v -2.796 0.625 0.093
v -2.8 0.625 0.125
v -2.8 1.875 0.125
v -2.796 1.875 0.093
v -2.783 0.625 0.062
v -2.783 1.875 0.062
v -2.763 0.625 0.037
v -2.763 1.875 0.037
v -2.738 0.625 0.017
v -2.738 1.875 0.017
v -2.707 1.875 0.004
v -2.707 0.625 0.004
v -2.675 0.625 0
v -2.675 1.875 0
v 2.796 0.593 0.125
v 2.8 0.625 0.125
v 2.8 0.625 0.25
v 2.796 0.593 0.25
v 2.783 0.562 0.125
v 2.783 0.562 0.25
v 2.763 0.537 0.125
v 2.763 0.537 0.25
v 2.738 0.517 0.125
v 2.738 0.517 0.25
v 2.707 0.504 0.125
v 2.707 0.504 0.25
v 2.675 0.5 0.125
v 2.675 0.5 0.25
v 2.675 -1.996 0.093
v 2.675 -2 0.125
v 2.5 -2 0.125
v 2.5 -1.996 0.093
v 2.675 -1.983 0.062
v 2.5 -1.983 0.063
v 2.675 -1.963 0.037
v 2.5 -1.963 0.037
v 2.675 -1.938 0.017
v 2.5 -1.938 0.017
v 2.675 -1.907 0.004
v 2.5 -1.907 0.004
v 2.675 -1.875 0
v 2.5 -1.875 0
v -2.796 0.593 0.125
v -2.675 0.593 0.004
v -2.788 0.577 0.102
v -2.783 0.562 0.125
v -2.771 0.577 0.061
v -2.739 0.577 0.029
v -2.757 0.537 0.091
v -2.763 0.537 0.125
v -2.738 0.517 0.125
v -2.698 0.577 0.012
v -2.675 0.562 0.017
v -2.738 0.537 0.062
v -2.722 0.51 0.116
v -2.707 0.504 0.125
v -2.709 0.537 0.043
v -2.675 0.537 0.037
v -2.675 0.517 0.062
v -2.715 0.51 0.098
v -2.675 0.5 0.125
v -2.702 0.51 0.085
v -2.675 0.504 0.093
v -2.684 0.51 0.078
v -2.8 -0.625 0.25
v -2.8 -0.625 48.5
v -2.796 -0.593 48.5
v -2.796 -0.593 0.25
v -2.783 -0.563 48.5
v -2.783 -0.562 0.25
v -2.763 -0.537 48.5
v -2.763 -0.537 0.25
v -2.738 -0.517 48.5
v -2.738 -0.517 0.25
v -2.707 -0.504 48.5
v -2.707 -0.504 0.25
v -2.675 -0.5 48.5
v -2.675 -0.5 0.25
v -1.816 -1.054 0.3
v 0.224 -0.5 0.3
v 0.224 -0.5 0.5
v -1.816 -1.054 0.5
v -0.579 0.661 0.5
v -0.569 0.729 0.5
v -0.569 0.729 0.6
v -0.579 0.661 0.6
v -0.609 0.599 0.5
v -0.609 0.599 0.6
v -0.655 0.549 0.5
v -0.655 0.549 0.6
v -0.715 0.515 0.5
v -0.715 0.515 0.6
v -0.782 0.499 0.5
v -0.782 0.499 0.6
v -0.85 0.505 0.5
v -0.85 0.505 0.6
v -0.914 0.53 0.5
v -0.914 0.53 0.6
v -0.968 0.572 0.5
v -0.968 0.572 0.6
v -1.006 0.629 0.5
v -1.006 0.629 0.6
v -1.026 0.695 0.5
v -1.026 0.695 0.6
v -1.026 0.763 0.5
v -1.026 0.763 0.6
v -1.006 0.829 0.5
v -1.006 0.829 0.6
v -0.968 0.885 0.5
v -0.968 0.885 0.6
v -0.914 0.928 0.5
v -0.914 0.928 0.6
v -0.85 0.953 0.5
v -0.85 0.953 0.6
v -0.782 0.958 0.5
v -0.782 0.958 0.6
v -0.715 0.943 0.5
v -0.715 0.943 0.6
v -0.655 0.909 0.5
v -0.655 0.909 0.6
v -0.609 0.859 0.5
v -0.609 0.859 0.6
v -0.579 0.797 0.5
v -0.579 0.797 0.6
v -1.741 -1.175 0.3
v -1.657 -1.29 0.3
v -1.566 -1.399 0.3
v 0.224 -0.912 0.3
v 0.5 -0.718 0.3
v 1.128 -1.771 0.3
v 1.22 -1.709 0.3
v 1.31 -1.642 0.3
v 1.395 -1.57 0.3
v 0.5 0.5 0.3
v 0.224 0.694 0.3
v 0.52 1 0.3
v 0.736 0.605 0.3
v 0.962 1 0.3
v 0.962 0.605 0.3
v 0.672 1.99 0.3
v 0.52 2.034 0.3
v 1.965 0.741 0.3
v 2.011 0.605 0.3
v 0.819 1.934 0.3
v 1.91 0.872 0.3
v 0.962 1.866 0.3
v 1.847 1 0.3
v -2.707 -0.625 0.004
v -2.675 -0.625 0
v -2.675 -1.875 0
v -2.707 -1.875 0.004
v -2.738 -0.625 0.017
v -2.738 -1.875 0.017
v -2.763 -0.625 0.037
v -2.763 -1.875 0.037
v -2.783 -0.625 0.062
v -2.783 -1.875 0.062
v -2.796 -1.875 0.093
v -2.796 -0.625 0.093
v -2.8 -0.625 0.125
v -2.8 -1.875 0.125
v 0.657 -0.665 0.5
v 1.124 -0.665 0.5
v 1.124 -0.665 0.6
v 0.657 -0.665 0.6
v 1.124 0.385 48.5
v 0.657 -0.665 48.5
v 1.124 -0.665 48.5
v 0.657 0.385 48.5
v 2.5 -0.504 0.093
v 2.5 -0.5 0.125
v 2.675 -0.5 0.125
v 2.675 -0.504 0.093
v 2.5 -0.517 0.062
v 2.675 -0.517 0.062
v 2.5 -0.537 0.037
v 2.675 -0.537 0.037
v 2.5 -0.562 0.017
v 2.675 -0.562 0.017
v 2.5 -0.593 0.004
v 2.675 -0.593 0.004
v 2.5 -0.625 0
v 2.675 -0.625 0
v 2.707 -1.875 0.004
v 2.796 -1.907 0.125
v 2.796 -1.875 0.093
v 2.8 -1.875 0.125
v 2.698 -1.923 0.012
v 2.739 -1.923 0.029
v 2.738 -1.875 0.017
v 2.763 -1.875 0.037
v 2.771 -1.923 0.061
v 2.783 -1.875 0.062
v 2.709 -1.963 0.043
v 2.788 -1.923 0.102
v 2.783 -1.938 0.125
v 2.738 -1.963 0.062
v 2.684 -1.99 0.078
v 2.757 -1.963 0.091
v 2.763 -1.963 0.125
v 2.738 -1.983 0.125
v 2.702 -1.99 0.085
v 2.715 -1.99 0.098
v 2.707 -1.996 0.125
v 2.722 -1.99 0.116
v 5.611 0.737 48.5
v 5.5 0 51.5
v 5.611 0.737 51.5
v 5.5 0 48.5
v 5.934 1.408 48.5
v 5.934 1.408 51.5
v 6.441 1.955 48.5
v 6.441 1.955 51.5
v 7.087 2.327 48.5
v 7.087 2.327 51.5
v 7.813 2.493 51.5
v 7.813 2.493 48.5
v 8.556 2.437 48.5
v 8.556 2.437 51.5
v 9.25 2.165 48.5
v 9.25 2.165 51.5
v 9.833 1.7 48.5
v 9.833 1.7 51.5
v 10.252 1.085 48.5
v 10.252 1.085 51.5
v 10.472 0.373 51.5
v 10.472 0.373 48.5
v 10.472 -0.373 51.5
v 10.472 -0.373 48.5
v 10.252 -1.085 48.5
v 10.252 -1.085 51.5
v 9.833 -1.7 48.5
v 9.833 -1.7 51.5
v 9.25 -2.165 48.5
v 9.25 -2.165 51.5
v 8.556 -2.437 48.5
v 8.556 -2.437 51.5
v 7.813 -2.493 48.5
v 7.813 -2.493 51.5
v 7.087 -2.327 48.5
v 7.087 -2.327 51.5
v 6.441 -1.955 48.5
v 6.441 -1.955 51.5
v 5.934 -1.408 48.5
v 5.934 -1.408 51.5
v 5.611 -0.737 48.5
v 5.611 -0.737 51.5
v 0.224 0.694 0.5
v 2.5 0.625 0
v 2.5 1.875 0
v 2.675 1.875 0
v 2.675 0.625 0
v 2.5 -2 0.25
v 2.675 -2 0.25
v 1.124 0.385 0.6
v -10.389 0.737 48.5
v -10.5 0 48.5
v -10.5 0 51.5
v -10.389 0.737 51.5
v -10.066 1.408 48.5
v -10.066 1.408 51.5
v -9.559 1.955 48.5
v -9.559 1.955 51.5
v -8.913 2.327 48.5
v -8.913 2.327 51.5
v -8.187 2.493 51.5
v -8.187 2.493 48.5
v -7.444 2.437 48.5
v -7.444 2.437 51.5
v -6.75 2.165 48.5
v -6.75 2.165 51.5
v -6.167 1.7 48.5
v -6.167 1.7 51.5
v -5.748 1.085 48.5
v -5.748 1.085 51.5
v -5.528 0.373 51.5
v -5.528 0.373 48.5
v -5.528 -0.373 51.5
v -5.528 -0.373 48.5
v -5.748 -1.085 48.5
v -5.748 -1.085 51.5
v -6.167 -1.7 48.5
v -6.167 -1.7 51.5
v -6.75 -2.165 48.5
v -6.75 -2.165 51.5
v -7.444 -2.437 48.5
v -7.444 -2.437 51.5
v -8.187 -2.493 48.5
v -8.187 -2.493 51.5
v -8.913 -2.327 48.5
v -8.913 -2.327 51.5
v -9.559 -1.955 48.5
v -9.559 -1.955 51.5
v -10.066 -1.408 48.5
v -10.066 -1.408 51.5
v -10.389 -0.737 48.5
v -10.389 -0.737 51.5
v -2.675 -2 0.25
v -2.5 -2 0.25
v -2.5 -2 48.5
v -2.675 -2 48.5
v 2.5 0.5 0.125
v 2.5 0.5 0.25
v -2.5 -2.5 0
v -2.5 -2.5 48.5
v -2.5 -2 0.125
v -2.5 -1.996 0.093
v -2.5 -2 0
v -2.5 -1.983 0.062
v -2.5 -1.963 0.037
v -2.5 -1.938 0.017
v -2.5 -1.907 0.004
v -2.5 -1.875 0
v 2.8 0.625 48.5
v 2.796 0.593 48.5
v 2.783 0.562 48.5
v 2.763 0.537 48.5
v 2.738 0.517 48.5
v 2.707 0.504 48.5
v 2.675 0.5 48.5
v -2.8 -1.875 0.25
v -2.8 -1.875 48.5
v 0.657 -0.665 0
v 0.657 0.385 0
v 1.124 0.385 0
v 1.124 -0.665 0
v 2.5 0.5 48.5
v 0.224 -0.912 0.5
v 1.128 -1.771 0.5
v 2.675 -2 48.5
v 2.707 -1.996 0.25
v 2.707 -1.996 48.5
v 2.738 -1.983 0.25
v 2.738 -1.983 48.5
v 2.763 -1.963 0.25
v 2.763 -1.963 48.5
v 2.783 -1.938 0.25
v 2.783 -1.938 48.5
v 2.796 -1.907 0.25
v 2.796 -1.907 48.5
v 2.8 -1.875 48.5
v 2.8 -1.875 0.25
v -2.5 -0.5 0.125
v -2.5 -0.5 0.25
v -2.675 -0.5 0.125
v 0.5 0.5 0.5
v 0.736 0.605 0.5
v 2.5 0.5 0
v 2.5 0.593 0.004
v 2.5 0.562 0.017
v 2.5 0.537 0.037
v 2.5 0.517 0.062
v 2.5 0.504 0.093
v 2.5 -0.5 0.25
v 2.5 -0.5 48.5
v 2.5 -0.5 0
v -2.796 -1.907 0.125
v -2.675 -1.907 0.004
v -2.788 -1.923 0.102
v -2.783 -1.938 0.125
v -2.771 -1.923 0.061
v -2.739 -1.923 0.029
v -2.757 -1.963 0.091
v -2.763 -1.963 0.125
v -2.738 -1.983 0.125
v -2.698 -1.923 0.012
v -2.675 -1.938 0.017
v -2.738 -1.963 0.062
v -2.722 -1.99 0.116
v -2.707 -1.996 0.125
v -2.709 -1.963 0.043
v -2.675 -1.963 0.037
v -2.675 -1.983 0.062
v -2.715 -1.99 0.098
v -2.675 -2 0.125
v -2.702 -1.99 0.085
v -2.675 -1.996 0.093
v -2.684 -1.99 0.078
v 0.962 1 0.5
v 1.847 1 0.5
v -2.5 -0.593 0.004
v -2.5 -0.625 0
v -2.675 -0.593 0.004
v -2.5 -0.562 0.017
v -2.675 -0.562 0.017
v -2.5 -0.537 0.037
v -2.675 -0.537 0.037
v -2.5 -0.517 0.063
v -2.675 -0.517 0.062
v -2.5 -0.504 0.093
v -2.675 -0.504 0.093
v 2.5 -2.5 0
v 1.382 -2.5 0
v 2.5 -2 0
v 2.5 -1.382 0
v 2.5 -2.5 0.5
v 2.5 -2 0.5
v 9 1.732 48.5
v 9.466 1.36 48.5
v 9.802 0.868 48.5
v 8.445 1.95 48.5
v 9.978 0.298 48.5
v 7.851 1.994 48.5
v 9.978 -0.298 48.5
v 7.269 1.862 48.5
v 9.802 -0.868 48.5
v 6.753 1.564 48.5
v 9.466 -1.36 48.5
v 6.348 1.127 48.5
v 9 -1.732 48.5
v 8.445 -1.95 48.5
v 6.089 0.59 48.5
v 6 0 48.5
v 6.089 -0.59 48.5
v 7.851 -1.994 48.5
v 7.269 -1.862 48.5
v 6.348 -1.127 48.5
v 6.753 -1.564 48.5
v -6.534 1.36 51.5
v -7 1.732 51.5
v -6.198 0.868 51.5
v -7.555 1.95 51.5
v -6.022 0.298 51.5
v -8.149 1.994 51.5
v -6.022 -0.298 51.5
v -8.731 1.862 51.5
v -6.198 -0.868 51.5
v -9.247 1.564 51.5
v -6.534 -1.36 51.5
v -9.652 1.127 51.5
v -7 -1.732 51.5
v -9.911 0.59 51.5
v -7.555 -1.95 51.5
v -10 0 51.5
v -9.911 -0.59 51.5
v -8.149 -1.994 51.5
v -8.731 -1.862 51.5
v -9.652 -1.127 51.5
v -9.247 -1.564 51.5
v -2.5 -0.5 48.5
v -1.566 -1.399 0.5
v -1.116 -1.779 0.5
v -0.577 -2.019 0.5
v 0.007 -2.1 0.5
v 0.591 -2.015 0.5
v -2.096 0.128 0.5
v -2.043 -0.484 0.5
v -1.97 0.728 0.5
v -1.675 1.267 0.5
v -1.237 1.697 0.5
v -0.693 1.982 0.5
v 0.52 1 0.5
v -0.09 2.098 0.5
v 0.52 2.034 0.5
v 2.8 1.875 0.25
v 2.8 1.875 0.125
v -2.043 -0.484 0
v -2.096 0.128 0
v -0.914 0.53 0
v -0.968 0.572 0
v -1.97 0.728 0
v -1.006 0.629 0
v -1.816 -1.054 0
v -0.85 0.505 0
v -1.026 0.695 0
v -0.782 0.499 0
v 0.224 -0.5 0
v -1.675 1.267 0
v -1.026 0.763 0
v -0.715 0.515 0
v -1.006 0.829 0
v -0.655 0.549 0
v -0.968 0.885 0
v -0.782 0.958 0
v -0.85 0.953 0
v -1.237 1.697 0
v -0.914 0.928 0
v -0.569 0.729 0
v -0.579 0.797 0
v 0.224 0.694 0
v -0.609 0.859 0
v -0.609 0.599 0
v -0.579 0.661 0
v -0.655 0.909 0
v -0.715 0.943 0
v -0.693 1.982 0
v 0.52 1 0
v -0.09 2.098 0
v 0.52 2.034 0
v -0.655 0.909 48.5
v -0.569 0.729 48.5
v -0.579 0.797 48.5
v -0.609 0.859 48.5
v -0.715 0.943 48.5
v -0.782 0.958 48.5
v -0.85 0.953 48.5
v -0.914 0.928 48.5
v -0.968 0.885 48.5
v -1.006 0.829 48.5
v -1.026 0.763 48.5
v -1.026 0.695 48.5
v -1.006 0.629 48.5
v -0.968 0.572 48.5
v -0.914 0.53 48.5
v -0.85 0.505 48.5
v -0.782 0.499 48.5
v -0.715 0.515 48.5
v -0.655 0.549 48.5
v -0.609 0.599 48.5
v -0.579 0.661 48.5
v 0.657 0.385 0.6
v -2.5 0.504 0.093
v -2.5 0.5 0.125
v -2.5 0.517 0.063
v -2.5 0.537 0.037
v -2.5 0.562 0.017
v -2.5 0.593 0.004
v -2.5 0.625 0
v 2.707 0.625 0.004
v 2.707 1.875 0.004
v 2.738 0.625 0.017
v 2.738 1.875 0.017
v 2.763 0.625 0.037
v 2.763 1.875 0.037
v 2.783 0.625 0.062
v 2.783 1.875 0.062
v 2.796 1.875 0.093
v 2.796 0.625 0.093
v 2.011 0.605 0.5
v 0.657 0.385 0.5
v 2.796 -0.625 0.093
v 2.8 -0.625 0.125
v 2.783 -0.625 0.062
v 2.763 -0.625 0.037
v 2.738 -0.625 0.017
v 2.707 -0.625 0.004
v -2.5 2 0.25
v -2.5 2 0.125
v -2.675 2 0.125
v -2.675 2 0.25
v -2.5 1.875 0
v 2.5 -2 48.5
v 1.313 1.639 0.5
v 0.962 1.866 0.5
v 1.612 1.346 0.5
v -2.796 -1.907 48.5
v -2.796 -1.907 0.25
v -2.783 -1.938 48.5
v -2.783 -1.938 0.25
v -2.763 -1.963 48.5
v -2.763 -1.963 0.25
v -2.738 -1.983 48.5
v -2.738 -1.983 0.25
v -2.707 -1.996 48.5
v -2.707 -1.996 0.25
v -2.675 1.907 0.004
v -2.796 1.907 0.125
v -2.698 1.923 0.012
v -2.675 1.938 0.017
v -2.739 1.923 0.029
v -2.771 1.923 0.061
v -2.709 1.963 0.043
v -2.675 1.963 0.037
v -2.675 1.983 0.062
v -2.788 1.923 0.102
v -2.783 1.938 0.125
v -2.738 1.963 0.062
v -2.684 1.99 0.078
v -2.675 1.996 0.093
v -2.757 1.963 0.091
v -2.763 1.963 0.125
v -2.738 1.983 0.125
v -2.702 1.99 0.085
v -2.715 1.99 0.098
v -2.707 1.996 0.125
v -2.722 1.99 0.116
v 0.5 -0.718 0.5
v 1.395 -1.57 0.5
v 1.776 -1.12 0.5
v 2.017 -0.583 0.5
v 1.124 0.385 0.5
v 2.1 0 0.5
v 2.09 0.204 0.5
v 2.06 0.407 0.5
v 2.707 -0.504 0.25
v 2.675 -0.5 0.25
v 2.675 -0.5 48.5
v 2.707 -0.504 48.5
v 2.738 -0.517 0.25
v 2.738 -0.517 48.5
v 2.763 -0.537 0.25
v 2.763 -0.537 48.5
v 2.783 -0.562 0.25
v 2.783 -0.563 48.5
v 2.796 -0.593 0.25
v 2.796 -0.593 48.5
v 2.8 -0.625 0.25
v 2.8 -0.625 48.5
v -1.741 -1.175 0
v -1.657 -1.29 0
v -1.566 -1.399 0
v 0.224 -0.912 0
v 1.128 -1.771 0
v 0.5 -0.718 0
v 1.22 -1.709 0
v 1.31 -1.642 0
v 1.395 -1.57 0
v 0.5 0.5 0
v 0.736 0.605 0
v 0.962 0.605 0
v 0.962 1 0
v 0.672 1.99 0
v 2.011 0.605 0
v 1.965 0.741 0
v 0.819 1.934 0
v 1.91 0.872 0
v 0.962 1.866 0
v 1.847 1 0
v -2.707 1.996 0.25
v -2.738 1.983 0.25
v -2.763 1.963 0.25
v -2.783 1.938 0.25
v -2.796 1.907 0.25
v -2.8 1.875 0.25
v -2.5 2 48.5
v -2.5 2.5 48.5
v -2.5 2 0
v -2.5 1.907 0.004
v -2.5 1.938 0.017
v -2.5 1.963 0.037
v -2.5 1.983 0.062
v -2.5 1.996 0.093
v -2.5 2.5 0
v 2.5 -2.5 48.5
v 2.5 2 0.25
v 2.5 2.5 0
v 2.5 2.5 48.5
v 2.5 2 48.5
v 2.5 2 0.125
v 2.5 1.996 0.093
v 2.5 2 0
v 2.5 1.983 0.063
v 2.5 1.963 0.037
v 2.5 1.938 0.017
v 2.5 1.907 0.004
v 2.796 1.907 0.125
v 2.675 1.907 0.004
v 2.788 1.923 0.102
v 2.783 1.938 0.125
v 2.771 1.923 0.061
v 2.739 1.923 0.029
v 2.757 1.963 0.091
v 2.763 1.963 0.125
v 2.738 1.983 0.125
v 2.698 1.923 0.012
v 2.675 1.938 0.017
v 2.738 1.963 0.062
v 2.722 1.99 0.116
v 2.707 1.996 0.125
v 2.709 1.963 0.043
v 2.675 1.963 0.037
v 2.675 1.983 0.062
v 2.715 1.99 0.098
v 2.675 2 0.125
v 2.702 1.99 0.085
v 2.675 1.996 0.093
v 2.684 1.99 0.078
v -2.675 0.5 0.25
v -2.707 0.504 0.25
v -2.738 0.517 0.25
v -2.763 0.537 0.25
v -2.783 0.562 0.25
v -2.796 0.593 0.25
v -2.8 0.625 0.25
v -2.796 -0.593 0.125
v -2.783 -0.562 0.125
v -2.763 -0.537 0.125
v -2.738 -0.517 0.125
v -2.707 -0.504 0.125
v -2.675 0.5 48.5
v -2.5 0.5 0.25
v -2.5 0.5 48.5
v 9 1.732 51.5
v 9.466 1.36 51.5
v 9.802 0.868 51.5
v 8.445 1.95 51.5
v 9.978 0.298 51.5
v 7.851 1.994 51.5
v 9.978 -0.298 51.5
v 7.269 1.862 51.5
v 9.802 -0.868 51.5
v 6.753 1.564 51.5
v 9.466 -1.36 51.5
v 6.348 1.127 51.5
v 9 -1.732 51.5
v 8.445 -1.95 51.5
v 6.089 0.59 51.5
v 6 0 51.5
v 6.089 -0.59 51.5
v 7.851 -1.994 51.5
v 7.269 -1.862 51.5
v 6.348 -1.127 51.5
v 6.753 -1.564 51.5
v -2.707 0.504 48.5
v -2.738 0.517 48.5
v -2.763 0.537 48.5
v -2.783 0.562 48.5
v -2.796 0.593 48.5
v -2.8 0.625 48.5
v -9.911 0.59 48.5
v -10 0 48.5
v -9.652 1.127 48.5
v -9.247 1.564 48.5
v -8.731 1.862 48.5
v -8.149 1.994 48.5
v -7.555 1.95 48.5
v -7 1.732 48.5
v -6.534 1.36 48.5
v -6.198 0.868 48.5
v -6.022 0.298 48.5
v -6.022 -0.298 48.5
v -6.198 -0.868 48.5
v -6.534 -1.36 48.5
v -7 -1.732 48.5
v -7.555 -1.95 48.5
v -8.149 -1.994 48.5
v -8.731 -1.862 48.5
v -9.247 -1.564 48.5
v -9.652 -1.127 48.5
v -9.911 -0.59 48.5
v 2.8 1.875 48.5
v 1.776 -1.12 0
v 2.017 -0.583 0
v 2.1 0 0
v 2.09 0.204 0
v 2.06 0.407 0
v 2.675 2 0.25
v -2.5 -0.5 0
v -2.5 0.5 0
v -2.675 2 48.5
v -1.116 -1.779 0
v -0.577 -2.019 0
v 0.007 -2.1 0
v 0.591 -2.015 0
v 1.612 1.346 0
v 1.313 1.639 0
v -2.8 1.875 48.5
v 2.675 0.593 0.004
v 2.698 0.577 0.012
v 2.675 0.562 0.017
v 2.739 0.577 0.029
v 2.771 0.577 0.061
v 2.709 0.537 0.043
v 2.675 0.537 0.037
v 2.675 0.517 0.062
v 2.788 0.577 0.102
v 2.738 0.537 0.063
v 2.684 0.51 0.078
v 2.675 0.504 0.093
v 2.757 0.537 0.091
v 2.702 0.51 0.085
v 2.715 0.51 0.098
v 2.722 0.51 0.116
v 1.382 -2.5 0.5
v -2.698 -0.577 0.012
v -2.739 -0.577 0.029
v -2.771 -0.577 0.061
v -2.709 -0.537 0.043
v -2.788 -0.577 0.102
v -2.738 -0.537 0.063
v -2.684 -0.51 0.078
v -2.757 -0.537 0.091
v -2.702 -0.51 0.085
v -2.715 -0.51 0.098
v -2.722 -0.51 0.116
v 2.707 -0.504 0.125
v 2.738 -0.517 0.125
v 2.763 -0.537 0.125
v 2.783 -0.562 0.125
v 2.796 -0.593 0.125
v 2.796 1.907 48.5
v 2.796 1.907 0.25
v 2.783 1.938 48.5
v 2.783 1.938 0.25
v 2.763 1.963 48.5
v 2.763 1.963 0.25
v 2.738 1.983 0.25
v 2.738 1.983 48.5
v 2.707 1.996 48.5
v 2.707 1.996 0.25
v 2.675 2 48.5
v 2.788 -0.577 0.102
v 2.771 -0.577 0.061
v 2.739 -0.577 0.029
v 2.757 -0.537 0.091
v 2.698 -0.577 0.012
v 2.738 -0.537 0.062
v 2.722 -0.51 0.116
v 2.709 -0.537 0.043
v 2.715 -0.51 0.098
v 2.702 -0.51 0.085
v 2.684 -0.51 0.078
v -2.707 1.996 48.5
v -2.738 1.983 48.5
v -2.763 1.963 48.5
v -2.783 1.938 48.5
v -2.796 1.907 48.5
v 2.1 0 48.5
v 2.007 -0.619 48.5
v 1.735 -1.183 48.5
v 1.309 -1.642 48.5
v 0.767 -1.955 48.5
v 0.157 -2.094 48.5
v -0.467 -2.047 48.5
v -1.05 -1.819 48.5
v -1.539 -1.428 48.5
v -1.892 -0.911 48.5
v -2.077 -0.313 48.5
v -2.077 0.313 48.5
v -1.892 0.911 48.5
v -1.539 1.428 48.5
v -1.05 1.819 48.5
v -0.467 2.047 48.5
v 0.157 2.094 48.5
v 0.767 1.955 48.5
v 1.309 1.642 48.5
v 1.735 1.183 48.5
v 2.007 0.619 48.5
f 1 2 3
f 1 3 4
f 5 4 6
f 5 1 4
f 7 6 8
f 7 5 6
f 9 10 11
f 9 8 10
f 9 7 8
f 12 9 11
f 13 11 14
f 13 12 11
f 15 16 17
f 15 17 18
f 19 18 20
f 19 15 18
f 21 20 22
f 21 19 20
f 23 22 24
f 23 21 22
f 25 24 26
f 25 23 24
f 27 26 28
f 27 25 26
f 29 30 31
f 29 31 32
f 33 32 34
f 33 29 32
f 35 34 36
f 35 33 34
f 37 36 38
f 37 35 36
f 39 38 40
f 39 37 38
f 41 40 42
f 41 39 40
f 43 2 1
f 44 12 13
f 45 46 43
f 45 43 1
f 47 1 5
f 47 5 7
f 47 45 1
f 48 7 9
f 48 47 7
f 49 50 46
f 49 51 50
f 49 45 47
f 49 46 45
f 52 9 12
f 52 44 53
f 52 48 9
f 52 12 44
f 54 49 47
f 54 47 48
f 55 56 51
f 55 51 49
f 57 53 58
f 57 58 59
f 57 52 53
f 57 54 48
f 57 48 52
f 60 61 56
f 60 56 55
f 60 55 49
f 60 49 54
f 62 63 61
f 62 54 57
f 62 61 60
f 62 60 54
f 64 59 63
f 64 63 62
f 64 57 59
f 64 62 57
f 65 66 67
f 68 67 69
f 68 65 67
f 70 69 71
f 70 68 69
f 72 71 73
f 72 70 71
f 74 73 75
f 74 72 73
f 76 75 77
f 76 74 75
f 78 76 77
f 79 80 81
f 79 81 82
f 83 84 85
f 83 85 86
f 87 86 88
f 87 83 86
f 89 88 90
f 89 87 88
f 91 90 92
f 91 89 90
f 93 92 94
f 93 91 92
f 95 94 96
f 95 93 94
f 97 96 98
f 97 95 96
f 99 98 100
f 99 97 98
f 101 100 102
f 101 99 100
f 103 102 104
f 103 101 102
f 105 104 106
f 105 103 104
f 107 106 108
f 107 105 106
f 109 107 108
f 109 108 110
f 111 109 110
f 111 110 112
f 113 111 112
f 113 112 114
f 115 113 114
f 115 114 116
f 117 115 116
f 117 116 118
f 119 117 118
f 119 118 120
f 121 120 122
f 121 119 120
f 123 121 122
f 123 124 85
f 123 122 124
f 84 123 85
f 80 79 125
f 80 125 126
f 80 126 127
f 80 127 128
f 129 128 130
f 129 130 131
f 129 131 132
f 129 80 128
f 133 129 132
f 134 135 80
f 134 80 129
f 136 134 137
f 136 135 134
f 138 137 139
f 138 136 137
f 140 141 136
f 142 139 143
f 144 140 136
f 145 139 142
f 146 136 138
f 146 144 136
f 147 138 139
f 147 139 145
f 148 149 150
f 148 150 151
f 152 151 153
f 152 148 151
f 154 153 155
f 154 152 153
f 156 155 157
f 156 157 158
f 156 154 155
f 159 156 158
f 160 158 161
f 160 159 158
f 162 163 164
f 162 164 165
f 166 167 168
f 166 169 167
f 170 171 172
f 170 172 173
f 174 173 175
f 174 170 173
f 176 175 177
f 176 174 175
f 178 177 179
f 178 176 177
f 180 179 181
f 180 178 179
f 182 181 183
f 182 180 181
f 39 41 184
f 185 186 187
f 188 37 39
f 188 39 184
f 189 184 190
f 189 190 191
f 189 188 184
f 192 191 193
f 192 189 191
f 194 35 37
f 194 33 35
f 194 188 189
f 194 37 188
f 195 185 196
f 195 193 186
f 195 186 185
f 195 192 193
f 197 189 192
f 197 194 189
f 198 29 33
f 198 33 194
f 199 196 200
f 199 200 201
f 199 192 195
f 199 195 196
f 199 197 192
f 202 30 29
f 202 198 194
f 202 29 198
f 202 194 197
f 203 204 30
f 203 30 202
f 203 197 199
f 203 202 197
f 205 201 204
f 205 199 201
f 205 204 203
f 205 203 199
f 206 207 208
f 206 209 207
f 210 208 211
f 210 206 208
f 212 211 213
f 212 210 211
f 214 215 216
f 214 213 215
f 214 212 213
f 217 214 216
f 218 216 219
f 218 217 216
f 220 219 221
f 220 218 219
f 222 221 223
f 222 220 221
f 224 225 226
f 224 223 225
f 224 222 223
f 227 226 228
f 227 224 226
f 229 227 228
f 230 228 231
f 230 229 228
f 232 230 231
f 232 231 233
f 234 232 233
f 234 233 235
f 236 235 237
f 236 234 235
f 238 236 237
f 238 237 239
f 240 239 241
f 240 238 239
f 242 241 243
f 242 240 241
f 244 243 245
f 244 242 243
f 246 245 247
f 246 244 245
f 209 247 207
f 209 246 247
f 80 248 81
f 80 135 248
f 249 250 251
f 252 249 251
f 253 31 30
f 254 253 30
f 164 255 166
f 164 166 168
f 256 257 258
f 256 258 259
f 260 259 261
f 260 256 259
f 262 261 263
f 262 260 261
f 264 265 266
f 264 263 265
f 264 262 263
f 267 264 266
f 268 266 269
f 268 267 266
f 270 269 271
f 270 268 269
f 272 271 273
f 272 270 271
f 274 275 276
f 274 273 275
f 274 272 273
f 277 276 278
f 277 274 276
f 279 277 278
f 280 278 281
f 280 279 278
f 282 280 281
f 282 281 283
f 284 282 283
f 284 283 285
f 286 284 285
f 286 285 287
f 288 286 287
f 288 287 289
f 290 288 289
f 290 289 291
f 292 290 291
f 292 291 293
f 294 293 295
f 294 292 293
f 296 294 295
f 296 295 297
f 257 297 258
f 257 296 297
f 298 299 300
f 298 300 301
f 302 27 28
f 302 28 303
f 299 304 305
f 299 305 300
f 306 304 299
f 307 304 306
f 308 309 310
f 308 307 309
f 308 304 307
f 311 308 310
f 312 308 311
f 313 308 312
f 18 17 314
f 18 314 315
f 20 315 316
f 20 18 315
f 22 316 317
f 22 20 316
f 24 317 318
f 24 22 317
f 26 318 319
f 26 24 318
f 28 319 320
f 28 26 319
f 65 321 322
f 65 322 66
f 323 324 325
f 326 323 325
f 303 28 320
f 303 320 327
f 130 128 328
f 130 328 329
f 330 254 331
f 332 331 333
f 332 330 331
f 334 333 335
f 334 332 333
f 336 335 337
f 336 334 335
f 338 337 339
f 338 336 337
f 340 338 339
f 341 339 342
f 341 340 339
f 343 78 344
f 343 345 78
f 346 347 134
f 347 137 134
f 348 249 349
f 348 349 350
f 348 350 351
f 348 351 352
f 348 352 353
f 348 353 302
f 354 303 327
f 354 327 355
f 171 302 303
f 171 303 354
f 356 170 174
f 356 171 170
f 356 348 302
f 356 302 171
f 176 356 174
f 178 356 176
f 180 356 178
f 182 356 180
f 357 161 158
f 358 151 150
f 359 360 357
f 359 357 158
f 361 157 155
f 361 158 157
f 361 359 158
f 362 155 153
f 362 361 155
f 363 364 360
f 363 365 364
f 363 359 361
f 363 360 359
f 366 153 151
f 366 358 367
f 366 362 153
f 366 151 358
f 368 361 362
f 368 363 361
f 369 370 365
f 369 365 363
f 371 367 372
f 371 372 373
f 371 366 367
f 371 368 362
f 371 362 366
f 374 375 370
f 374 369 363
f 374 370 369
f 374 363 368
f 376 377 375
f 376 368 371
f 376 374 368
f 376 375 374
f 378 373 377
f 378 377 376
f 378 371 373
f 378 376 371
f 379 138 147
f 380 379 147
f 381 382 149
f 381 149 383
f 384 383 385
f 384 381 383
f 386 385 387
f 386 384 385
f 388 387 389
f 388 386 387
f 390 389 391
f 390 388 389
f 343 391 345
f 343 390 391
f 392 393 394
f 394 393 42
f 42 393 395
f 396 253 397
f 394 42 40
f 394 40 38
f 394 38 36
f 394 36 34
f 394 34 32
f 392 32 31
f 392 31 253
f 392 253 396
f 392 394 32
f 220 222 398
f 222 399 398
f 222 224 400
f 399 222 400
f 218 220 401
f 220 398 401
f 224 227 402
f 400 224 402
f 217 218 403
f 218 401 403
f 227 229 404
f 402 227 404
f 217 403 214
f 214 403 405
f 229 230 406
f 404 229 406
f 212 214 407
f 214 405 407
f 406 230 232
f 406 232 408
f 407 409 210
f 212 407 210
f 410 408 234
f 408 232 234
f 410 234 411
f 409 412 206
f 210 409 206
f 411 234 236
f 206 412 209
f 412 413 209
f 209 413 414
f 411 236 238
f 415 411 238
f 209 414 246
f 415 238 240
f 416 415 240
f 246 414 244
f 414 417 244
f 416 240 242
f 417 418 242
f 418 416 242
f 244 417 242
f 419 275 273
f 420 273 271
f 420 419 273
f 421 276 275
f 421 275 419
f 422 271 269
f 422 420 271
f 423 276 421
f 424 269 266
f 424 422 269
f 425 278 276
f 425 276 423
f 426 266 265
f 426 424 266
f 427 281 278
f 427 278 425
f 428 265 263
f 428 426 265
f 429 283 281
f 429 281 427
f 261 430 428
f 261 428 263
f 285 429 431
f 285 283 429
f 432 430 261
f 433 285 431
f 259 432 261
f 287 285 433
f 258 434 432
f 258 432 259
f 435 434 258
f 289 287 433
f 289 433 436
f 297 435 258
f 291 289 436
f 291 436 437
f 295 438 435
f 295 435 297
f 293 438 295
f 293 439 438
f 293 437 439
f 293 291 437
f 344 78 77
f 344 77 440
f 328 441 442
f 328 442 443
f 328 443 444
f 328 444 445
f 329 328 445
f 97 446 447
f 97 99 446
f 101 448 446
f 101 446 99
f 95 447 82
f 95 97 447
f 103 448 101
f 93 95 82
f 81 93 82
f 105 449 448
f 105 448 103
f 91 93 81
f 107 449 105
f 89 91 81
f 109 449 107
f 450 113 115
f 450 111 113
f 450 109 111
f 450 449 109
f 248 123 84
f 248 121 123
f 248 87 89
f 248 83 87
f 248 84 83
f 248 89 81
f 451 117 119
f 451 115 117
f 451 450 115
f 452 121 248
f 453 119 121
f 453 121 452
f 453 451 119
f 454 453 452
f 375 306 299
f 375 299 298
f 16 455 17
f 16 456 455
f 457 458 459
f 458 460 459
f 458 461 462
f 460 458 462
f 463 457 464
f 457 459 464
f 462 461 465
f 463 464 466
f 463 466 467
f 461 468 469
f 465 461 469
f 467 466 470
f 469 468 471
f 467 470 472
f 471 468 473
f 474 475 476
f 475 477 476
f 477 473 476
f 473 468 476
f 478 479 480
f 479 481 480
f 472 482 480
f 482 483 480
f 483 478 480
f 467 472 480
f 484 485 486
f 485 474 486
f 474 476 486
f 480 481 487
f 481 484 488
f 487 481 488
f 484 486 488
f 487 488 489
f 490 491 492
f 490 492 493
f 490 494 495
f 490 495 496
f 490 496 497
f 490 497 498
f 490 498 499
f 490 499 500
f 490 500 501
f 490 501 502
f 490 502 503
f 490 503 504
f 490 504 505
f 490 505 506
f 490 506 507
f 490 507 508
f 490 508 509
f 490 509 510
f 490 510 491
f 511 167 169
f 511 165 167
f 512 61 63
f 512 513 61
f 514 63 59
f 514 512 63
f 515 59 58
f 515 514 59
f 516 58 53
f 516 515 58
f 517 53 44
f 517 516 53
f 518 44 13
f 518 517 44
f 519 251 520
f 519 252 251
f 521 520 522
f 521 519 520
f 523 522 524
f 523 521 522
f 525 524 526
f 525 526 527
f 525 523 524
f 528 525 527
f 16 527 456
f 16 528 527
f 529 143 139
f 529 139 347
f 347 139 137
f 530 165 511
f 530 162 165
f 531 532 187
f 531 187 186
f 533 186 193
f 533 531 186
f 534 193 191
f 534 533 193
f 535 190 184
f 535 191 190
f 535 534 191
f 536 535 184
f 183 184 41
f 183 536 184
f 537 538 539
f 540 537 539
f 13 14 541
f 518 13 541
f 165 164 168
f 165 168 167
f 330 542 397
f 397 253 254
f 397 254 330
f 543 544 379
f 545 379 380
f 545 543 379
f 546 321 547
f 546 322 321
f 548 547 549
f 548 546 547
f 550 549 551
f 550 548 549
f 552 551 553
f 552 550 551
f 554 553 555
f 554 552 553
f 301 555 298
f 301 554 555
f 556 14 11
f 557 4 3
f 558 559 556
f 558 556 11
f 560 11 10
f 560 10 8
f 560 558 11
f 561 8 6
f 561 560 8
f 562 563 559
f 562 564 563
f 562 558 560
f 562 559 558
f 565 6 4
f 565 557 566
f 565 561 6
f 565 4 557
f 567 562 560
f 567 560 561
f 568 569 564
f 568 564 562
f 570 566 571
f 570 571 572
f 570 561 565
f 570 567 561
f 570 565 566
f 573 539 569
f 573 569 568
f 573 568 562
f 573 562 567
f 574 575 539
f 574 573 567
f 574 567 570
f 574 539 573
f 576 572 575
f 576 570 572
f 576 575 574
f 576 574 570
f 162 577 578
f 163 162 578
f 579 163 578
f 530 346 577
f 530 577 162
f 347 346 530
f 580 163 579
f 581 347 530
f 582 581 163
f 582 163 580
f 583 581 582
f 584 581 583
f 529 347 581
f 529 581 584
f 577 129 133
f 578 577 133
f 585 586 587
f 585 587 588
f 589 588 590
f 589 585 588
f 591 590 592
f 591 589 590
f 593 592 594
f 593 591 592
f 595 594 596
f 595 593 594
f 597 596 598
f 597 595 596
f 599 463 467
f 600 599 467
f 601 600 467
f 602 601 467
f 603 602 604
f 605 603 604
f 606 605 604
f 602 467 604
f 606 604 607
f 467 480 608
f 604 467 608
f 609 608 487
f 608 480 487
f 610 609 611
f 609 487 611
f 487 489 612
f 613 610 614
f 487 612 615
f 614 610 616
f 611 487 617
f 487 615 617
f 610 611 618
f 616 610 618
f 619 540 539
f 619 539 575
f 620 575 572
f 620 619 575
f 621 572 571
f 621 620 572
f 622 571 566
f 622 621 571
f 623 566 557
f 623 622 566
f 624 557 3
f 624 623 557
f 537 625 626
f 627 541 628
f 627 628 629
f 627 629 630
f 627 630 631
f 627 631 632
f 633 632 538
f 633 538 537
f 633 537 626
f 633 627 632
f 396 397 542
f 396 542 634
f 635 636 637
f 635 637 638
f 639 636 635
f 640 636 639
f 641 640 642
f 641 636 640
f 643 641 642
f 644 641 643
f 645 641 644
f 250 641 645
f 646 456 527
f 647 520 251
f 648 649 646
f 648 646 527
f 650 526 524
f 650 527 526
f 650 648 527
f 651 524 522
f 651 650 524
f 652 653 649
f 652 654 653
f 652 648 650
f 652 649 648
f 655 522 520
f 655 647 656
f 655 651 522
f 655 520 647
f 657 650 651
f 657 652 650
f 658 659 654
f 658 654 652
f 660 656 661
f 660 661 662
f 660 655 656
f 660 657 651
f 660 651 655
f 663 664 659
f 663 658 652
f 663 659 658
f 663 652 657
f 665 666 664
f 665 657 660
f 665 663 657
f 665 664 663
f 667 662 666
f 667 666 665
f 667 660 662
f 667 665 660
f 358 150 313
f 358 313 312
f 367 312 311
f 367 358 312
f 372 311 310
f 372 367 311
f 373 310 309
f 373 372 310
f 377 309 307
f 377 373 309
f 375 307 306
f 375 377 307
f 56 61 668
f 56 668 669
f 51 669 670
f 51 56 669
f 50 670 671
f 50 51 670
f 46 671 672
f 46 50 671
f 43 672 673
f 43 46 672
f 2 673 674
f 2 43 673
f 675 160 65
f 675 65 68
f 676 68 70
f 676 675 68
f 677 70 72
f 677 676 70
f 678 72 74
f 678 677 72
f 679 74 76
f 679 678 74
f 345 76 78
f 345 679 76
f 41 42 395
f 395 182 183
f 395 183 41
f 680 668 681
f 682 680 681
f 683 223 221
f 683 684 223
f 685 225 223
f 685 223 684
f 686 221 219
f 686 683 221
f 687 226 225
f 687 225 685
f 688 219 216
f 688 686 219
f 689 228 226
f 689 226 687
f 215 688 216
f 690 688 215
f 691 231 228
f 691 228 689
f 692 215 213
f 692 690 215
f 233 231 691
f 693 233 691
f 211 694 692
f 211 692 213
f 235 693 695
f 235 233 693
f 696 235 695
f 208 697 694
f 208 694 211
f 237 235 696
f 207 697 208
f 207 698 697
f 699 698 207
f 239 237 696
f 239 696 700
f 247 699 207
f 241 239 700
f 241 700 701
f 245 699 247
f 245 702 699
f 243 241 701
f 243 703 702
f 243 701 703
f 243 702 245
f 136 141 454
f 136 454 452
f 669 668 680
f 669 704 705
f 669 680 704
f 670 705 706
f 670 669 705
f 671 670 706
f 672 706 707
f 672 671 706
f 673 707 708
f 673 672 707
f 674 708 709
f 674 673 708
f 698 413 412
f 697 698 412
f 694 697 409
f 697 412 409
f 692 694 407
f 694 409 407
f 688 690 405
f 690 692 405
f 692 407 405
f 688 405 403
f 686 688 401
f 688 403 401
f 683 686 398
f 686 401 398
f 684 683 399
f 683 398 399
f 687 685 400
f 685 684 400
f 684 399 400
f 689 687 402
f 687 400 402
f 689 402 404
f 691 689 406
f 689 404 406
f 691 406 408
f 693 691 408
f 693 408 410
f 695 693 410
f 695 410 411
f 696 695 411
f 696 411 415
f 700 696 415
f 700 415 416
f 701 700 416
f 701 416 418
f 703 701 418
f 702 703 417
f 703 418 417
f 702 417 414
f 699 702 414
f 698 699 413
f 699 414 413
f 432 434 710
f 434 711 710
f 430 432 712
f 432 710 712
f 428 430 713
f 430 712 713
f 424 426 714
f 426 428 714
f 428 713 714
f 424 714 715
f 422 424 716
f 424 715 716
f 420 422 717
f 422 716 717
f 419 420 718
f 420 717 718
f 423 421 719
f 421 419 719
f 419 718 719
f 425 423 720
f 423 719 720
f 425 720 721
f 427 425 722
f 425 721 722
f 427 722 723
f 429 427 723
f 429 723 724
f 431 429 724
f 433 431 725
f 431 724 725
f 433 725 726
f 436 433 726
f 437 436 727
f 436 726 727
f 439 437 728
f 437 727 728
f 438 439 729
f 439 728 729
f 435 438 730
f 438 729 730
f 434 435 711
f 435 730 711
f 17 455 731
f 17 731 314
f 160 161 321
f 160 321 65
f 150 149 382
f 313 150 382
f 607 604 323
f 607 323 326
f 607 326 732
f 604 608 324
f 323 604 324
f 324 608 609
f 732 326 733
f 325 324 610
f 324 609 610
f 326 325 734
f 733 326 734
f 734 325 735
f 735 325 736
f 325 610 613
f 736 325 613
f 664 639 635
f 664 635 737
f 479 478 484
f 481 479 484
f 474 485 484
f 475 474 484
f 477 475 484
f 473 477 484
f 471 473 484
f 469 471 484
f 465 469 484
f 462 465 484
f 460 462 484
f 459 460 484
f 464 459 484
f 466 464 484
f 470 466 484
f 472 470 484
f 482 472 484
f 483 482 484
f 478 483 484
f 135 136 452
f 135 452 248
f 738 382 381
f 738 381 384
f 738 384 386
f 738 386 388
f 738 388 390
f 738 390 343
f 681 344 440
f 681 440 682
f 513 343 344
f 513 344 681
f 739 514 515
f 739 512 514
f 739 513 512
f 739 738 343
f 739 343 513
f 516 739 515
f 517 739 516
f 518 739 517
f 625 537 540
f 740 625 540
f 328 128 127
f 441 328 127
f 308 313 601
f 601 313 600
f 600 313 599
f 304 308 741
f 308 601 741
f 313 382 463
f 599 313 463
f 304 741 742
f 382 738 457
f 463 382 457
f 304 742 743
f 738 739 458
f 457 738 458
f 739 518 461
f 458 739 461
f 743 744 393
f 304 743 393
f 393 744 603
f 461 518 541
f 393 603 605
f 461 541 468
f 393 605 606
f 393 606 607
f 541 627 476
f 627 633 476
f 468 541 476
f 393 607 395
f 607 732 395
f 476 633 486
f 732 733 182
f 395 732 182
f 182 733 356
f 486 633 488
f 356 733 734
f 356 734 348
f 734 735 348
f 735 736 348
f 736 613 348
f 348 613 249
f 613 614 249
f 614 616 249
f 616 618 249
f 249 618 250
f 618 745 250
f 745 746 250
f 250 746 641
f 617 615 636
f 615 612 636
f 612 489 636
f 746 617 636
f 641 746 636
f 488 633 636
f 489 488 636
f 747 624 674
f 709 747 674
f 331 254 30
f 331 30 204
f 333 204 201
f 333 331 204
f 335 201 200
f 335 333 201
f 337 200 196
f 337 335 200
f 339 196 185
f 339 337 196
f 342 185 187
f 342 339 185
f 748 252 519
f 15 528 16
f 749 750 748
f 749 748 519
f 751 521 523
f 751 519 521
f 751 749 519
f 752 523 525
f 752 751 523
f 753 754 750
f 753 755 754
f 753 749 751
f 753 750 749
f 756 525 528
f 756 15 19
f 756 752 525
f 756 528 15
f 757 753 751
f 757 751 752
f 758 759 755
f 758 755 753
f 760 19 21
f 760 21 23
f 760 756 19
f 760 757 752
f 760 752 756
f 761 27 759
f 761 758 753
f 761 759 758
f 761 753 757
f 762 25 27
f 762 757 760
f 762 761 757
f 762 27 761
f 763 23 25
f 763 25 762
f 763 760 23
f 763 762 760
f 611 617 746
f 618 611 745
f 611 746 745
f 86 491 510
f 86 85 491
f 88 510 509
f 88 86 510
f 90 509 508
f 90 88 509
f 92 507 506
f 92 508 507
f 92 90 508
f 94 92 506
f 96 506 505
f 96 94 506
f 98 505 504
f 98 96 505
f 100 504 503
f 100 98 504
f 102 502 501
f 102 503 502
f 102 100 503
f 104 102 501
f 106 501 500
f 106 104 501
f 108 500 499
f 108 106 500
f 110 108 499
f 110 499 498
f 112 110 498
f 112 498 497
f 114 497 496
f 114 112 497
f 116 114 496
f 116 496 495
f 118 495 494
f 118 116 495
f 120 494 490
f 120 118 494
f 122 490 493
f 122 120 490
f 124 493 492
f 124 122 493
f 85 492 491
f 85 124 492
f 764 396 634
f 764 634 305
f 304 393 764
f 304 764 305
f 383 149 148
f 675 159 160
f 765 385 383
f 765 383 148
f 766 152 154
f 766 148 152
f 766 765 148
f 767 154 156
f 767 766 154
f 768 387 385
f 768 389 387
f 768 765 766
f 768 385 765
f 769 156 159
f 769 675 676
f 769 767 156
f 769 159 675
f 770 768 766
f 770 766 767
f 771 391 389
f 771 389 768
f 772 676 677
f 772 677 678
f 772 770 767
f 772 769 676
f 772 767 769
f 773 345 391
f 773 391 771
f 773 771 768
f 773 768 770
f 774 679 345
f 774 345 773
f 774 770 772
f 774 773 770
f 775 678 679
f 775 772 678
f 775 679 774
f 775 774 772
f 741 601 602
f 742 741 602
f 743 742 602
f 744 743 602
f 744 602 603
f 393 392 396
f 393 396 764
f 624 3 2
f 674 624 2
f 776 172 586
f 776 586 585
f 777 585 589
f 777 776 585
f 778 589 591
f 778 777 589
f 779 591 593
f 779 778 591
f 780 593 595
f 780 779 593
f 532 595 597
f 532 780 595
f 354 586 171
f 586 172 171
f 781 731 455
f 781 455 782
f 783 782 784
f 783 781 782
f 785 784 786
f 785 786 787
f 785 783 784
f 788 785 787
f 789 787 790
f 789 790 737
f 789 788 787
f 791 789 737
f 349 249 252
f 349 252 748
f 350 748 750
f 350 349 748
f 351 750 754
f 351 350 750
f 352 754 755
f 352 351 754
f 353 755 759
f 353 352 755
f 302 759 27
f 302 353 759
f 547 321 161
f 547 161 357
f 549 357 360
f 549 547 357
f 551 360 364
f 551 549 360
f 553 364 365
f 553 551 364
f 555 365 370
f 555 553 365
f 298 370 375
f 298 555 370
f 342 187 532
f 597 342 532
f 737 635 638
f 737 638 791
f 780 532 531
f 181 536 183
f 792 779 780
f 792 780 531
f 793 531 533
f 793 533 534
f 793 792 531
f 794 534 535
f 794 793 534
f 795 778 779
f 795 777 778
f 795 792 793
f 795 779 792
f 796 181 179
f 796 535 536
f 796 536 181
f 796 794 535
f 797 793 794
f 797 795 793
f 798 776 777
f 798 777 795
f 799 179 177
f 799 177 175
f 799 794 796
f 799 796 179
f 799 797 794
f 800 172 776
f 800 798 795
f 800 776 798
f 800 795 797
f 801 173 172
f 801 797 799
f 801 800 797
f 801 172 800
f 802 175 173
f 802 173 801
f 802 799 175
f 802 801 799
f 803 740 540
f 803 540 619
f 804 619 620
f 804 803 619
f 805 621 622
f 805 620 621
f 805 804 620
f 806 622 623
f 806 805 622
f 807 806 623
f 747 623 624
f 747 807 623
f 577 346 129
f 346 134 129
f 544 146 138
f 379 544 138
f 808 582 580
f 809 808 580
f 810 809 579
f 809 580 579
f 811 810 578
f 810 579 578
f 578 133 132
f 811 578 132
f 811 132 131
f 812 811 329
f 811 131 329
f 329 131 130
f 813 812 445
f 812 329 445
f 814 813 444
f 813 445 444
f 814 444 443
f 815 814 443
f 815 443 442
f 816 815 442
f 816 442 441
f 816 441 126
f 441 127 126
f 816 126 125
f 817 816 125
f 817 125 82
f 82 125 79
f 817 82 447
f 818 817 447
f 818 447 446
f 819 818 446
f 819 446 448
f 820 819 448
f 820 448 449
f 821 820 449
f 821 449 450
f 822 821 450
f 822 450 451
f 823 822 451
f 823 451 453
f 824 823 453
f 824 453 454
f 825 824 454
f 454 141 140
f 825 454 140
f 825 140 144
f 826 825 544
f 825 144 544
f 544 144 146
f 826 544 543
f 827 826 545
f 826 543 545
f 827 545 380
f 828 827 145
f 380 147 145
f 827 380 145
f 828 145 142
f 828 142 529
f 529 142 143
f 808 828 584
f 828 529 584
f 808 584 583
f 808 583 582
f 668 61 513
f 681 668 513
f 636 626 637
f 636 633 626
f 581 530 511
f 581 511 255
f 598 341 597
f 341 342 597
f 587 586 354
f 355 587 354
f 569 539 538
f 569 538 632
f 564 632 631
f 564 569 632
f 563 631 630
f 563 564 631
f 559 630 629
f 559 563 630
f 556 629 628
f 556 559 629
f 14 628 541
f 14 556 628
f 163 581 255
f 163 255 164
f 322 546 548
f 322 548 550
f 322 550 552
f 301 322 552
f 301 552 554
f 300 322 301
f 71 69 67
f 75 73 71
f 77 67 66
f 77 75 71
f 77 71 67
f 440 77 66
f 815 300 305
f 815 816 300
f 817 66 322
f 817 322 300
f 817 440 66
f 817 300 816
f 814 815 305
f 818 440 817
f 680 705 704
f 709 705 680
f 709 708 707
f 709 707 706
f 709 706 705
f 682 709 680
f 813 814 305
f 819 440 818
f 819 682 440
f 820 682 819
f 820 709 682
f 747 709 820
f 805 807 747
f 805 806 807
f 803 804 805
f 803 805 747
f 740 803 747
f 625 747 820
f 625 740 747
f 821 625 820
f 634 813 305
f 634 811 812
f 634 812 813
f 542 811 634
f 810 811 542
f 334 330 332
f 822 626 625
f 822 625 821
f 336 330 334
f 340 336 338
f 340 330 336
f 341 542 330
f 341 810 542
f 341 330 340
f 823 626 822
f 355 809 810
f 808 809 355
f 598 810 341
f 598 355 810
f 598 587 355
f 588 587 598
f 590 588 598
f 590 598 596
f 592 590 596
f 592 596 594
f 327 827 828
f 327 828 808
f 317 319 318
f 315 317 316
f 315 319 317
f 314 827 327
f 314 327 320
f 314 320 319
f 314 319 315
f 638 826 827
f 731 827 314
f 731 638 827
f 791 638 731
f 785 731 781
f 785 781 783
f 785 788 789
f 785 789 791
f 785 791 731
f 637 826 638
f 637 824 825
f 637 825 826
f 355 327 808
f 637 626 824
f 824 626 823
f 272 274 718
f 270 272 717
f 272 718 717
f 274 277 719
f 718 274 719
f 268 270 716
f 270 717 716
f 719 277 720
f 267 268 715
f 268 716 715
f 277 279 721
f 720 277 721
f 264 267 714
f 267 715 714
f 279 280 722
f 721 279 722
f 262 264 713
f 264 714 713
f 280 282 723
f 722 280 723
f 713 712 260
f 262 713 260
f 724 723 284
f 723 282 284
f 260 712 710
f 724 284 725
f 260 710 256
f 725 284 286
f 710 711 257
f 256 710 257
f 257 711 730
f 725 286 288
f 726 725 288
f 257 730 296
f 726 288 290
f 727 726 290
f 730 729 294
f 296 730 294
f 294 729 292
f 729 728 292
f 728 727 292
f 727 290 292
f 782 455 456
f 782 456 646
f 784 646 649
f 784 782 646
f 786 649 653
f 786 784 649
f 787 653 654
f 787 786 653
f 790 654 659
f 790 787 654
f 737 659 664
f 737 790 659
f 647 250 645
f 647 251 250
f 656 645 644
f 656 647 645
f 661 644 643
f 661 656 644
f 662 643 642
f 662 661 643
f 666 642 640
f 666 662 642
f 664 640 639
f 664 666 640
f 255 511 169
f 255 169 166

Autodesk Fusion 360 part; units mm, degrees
sketch "スケッチ1" plane through (0, 0, 0) normal (0, 0, 1) x (1, 0, 0)
  line L0 (13.25, -8.75) -> (-13.25, -8.75)
  line L1 (-13.25, -8.75) -> (-13.25, 8.75)
  line L2 (-13.25, 8.75) -> (13.25, 8.75)
  line L3 (13.25, 8.75) -> (13.25, -8.75)
  line L4 (13.25, -8.75) -> (-13.25, 8.75) construction
  line L5 (-13.25, -8.75) -> (13.25, 8.75) construction
  dimension "d1" = 26.5
  dimension "d2" = 17.5
extrude "押し出し1" add sketch "スケッチ1" along normal blind 48.5 makes body 1
sketch "スケッチ2" plane through (0, 0, 48.5) normal (0, 0, 1) x (-1, 0, 0)
  line L0 (-13.25, -8.75) -> (13.25, -8.75)
  line L1 (13.25, -8.75) -> (13.25, 8.75)
  line L2 (13.25, 8.75) -> (-13.25, 8.75)
  line L3 (-13.25, 8.75) -> (-13.25, -8.75)
  circle A0 centre (-8, 0) radius 2.5
  circle A1 centre (-8, 0) radius 2
  circle A2 centre (8, 0) radius 2
  circle A3 centre (8, 0) radius 2.5
  dimension "d5" = 5
extrude "押し出し2" add sketch "スケッチ2" along normal blind 3 separate body contours A0 | A3 makes body 2 at (5.5031, 0.1246, 50.5) makes body 3 at (-10.4969, 0.1246, 50.5)

Autodesk Fusion 360 part; units mm, degrees
sketch "スケッチ1" plane through (0, 0, 0) normal (0, 0, 1) x (1, 0, 0)
  line L0 (2.5, -2.5) -> (-2.5, -2.5)
  line L1 (-2.5, -2.5) -> (-2.5, 2.5)
  line L2 (-2.5, 2.5) -> (2.5, 2.5)
  line L3 (2.5, 2.5) -> (2.5, -2.5)
  circle A0 centre (0, 0) radius 2.1
  line L4 (0.5204, 2.0345) -> (0.5204, 1)
  line L5 (0.5204, 1) -> (0.2245, 0.6936)
  line L6 (0.2245, 0.6936) -> (0.2245, -0.5)
  line L7 (0.2245, -0.5) -> (-1.8162, -1.0543)
  line L8 (0.2245, -0.9122) -> (-1.5665, -1.3986)
  line L9 (0.9625, 1.8665) -> (0.9625, 1)
  line L10 (0.9625, 1) -> (1.8466, 1)
  line L11 (0.9625, 0.6054) -> (2.0109, 0.6054)
  line L12 (0.9625, 0.6054) -> (0.7362, 0.6054)
  line L13 (0.7362, 0.6054) -> (0.5, 0.5)
  line L14 (0.5, 0.5) -> (0.5, -0.7181)
  line L15 (0.5, -0.7181) -> (1.3951, -1.5696)
  line L16 (0.2245, -0.9122) -> (1.1278, -1.7714)
  circle A1 centre (-0.7989, 0.7289) radius 0.2301
  line L17 (0.6568, 0.385) -> (1.1245, 0.385)
  line L18 (1.1245, 0.385) -> (1.1245, -0.6651)
  line L19 (1.1245, -0.6651) -> (0.6568, -0.6651)
  line L20 (0.6568, -0.6651) -> (0.6568, 0.385)
  line L21 (-2.5, 2) -> (-2.8, 2)
  line L22 (-2.8, 2) -> (-2.8, 0.5)
  line L23 (-2.8, 0.5) -> (-2.5, 0.5)
  line L24 (-2.5, -2) -> (-2.8, -2)
  line L25 (-2.8, -0.5) -> (-2.5, -0.5)
  line L26 (-2.8, -2) -> (-2.8, -0.5)
  line L27 (2.5, 2) -> (2.8, 2)
  line L28 (2.8, 0.5) -> (2.5, 0.5)
  line L29 (2.8, 2) -> (2.8, 0.5)
  line L30 (2.5, -2) -> (2.8, -2)
  line L31 (2.8, -0.5) -> (2.5, -0.5)
  line L32 (2.8, -2) -> (2.8, -0.5)
  line L33 (2.5, -1.3816) -> (1.3816, -2.5)
extrude "押し出し1" add sketch "スケッチ1" along normal blind 1 contours L0 L1 L2 L3 L33
extrude "押し出し2" add sketch "スケッチ1" along normal blind 0.5 contours L0 L3 L33 | A0 L11 L12 L13 L14 L15 | A0 L9 L10 | A0 L8 L16 | A0 L4 L5 L6 L7
extrude "押し出し3" add sketch "スケッチ1" along normal blind 0.6 contours A1 | L17 L18 L19 L20
extrude "押し出し4" add sketch "スケッチ1" along normal blind 0.3 contours A0 L4 L5 L6 L7 L8 L9 L10 L11 L12 L13 L14 L15 L16
extrude "押し出し5" add sketch "スケッチ1" along normal blind 0.25 contours L3 L30 L31 L32 | L1 L24 L25 L26 | L3 L27 L28 L29 | L1 L21 L22 L23
fillet "フィレット1" radius 0.125 8 edges at (2.8, -1.25, 0.25) (2.8, -1.25, 0) (2.8, 1.25, 0.25) (2.8, 1.25, 0) (-2.8, -1.25, 0.25) (-2.8, -1.25, 0) (-2.8, 1.25, 0) (-2.8, 1.25, 0.25)
fillet "フィレット2" radius 0.125 24 edges at (-2.5875, -2, 0) (-2.8, -2, 0.125) (-2.5875, -2, 0.25) (-2.5875, -0.5, 0.25) (-2.8, -0.5, 0.125) (-2.5875, -0.5, 0) (-2.5875, 0.5, 0) (-2.8, 0.5, 0.125) (-2.5875, 0.5, 0.25) (-2.5875, 2, 0.25) (-2.8, 2, 0.125) (-2.5875, 2, 0) (2.5875, 0.5, 0.25) (2.8, 0.5, 0.125) (2.5875, 0.5, 0) (2.5875, -0.5, 0) (2.8, -0.5, 0.125) (2.5875, -0.5, 0.25) (2.5875, -2, 0.25) (2.8, -2, 0.125) (2.5875, -2, 0) (2.5875, 2, 0) (2.8, 2, 0.125) (2.5875, 2, 0.25)
